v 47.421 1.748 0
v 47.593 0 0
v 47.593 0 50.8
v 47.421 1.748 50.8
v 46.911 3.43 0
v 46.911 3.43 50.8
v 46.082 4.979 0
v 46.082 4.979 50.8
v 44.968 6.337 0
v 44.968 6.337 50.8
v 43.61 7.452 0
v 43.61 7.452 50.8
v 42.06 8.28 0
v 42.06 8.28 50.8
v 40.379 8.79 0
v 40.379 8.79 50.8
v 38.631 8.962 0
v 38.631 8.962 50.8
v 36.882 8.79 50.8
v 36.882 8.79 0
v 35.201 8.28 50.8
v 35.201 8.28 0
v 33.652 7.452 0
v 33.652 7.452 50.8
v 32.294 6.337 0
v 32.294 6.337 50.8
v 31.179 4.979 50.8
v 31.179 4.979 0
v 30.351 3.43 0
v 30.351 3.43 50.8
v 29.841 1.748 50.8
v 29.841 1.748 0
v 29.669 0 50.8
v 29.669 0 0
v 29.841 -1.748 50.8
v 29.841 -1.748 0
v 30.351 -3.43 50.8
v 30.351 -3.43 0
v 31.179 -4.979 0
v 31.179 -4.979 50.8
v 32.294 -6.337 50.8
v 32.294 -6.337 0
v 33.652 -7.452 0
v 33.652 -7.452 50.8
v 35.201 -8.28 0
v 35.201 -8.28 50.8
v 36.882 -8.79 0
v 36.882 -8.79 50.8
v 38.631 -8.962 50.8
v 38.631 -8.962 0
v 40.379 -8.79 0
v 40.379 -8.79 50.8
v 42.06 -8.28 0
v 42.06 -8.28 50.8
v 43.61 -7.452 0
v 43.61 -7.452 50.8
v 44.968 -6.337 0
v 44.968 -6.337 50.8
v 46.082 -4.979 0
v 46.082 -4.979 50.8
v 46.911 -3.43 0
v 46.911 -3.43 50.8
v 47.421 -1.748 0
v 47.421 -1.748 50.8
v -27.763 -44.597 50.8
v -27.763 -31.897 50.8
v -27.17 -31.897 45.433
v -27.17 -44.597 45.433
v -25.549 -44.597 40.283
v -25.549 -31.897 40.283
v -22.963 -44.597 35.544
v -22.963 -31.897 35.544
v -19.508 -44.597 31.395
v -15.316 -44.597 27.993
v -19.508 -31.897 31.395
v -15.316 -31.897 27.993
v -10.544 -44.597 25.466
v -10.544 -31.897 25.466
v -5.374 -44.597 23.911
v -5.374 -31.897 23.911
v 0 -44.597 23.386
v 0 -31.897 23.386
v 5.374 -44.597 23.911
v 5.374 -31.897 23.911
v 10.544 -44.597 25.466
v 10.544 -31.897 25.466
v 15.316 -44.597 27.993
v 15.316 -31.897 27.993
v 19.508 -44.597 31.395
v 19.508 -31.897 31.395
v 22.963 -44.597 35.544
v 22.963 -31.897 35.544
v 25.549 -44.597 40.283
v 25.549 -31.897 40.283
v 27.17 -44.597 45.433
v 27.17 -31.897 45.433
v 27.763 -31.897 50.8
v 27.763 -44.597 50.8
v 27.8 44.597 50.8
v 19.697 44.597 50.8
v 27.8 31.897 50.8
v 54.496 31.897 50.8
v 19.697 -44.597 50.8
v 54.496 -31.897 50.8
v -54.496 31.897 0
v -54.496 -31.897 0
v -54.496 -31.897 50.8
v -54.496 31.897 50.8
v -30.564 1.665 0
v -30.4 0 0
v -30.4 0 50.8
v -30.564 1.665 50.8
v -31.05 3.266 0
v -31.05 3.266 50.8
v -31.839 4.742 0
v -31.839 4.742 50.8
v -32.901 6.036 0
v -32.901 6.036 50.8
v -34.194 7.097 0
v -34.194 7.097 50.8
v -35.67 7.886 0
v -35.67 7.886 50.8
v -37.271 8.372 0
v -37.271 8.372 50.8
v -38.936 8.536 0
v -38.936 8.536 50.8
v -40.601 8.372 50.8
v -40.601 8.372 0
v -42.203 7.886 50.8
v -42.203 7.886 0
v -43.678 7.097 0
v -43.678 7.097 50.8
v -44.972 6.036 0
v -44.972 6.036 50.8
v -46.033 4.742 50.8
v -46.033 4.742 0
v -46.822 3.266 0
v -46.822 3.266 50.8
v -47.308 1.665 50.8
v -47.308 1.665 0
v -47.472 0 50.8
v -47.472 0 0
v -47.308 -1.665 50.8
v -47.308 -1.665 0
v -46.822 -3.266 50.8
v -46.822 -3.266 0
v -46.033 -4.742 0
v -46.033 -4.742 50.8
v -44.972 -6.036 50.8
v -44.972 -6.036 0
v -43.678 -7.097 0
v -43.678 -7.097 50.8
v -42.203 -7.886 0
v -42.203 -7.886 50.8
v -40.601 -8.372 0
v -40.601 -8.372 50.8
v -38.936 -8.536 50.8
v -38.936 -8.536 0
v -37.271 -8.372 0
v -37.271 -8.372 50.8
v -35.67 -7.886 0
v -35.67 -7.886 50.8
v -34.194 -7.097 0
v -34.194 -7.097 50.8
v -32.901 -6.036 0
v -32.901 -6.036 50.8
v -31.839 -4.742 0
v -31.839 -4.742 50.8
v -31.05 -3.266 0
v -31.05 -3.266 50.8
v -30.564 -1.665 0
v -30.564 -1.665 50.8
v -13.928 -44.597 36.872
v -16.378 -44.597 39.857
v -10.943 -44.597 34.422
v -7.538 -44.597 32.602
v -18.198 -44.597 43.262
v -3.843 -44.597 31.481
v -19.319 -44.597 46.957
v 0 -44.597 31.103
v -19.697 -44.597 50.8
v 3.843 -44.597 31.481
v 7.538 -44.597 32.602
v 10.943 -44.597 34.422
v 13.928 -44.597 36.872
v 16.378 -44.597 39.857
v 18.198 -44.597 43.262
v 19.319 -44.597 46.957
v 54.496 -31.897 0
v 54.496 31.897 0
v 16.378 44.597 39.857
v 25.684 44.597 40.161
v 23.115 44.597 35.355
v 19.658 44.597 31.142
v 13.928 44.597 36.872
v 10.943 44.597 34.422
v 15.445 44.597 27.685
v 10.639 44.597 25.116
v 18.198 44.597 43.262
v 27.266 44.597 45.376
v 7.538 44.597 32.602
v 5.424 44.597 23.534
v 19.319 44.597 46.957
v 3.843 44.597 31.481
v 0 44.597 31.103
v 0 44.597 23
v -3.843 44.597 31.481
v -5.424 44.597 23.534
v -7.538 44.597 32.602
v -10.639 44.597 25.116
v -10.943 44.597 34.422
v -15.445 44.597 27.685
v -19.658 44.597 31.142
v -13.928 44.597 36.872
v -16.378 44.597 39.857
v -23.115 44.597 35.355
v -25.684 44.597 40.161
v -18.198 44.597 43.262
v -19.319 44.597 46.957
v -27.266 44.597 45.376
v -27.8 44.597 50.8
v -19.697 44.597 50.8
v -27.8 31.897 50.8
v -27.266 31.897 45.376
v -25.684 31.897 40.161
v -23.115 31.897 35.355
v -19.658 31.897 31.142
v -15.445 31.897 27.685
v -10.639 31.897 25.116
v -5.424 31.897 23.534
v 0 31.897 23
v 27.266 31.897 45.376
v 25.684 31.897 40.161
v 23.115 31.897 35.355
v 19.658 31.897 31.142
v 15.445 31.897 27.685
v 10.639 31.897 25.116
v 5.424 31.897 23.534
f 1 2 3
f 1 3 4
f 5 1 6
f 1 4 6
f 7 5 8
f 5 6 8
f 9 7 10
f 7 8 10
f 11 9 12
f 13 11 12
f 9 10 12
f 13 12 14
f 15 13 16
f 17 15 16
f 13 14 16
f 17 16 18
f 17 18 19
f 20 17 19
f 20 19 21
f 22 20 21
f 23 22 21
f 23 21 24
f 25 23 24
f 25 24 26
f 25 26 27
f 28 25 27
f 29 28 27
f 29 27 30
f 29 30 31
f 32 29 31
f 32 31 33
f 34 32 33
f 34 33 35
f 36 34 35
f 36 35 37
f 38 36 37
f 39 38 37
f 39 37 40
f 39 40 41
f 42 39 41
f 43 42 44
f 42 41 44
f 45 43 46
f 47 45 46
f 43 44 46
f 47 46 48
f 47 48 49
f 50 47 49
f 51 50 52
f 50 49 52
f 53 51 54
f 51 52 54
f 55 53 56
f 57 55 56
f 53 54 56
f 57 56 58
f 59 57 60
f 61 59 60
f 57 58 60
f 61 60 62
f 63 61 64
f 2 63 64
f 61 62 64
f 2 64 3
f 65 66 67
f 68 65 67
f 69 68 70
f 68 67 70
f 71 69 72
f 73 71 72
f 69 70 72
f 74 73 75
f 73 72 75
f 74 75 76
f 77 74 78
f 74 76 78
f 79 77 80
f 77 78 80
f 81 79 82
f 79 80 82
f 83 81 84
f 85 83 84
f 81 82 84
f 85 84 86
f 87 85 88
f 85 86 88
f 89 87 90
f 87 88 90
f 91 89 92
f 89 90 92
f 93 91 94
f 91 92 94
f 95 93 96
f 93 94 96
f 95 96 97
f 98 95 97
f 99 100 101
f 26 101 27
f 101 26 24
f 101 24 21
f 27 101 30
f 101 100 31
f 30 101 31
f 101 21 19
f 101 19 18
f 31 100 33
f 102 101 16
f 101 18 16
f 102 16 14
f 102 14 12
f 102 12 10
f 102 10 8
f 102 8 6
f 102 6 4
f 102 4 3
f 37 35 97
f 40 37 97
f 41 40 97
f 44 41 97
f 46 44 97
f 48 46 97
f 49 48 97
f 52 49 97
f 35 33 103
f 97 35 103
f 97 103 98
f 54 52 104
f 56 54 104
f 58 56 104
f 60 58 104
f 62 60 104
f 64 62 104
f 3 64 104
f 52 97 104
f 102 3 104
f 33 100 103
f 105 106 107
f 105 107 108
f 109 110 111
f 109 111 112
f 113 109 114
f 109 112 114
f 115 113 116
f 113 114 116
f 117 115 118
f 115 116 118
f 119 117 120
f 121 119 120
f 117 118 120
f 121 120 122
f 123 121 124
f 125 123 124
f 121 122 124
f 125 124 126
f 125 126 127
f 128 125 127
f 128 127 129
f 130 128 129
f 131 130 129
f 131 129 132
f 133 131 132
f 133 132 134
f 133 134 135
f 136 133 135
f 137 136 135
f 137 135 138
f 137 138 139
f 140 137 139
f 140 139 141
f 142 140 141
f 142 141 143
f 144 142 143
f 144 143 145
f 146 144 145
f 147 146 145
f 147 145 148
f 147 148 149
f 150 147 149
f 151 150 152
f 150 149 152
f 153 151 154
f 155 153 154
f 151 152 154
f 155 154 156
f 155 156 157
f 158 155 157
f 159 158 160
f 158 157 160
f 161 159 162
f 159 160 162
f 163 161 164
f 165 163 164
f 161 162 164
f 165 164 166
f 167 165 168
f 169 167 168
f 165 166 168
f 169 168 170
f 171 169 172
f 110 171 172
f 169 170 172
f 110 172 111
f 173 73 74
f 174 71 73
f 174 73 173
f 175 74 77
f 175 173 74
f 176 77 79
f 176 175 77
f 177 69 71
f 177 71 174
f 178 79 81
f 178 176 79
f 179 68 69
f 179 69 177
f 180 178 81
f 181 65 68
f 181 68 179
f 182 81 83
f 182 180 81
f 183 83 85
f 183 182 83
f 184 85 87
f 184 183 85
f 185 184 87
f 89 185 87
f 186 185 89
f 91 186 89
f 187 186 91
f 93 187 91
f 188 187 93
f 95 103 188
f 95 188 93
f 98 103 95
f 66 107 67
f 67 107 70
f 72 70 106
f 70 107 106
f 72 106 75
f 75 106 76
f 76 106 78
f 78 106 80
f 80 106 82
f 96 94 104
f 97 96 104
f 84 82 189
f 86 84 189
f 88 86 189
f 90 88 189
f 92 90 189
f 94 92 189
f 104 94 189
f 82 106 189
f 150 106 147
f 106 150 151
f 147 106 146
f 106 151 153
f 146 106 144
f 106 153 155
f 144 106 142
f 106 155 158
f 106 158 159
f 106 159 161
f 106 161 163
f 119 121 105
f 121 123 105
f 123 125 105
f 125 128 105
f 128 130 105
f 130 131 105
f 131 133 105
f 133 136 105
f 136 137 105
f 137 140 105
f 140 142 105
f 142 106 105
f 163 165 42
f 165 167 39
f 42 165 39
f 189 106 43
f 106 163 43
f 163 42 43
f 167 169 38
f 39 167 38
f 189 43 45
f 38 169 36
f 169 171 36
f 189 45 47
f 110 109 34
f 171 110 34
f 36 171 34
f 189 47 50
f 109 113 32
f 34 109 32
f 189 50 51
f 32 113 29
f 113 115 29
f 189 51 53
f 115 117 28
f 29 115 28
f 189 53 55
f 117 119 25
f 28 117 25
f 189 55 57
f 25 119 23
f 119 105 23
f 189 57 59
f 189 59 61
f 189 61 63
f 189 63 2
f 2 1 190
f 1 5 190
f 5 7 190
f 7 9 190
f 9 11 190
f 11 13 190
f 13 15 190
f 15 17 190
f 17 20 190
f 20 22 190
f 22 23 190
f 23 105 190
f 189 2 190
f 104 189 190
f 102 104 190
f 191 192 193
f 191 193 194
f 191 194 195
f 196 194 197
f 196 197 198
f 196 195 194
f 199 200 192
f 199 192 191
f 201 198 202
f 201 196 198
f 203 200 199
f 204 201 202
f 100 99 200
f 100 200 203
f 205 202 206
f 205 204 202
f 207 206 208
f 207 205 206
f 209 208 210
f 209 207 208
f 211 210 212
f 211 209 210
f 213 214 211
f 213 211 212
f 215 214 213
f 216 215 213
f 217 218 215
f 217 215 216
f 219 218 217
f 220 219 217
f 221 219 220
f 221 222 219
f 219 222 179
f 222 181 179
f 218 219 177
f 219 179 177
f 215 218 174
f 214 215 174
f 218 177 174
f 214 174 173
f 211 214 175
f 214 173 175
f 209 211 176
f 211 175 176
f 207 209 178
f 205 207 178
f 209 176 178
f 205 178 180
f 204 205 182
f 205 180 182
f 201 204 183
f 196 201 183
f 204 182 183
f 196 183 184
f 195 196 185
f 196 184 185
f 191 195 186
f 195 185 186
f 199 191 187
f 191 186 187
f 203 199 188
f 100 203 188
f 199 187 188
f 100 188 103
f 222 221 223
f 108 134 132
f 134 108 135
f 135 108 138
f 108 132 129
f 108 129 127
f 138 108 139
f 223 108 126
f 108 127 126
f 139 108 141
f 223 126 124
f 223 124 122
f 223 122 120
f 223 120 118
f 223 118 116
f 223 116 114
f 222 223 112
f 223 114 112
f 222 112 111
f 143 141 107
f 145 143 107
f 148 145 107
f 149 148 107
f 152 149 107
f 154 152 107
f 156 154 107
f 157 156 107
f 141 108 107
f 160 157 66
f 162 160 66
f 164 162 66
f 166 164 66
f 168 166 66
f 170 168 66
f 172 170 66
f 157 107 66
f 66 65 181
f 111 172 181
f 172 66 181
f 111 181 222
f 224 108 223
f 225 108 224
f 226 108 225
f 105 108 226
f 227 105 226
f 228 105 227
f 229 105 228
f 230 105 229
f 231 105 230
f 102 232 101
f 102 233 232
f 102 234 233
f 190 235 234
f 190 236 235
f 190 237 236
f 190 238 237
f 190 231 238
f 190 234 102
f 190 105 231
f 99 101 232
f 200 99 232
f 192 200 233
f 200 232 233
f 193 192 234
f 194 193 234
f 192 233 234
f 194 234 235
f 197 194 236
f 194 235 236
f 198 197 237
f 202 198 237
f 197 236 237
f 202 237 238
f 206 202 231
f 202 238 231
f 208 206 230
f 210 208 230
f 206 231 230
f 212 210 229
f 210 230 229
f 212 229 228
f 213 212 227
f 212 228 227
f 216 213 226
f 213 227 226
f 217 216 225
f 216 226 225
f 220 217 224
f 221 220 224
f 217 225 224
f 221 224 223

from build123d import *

# Parameters (mm, degrees)
F0_W      = 108.991236
F0_H      = 63.794724
F1_DEPTH  = 50.8
F4_DEPTH  = 89.916
F5_DEPTH  = 12.7
F7_DEPTH  = 12.7
F8_R      = 8.535678
F9_DEPTH  = 76.708
F10_R     = 8.962055
F11_DEPTH = 88.392


with BuildPart() as f1:
    # F0 (on Top) → F1 (new body)
    with BuildSketch(Plane.XY):
        Rectangle(F0_W, F0_H)
    extrude(amount=F1_DEPTH)

    # F2 (on face) → F4 (cut)
    with BuildSketch(Plane.XZ.offset(31.897362)):
        with BuildLine():
            Line((19.697172, 50.8), (-19.697172, 50.8))
            ThreePointArc((-19.697172, 50.8), (0, 31.102828), (19.697172, 50.8))
        make_face()
    extrude(amount=-F4_DEPTH, mode=Mode.SUBTRACT)

    # F3 (on face) → F5 (join)
    with BuildSketch(Plane.XZ.offset(31.897362)):
        with BuildLine():
            Line((-19.697172, 50.8), (-27.762748, 50.8))
            ThreePointArc((-27.762748, 50.8), (0, 23.38646), (27.762748, 50.8))
            Line((27.762748, 50.8), (19.697172, 50.8))
            ThreePointArc((19.697172, 50.8), (0, 31.102828), (-19.697172, 50.8))
        make_face()
    extrude(amount=F5_DEPTH)

    # F6 (on face) → F7 (join)
    with BuildSketch(Plane(origin=(0, 31.897362, 0), x_dir=(-1, 0, 0), z_dir=(0, 1, 0))):
        with BuildLine():
            ThreePointArc((-27.800228, 50.8), (0, 22.999772), (27.800228, 50.8))
            Line((27.800228, 50.8), (19.697172, 50.8))
            ThreePointArc((19.697172, 50.8), (0, 31.102828), (-19.697172, 50.8))
            Line((-19.697172, 50.8), (-27.800228, 50.8))
        make_face()
    extrude(amount=F7_DEPTH)

    # F8 (on face) → F9 (cut)
    with BuildSketch(Plane.XY.offset(50.8)):
        with Locations((-38.936164, 0)):
            Circle(F8_R)
    extrude(amount=-F9_DEPTH, mode=Mode.SUBTRACT)

    # F10 (on face) → F11 (cut)
    with BuildSketch(Plane.XY.offset(50.8)):
        with Locations((38.630784, 0)):
            Circle(F10_R)
    extrude(amount=-F11_DEPTH, mode=Mode.SUBTRACT)


solid = f1.part
